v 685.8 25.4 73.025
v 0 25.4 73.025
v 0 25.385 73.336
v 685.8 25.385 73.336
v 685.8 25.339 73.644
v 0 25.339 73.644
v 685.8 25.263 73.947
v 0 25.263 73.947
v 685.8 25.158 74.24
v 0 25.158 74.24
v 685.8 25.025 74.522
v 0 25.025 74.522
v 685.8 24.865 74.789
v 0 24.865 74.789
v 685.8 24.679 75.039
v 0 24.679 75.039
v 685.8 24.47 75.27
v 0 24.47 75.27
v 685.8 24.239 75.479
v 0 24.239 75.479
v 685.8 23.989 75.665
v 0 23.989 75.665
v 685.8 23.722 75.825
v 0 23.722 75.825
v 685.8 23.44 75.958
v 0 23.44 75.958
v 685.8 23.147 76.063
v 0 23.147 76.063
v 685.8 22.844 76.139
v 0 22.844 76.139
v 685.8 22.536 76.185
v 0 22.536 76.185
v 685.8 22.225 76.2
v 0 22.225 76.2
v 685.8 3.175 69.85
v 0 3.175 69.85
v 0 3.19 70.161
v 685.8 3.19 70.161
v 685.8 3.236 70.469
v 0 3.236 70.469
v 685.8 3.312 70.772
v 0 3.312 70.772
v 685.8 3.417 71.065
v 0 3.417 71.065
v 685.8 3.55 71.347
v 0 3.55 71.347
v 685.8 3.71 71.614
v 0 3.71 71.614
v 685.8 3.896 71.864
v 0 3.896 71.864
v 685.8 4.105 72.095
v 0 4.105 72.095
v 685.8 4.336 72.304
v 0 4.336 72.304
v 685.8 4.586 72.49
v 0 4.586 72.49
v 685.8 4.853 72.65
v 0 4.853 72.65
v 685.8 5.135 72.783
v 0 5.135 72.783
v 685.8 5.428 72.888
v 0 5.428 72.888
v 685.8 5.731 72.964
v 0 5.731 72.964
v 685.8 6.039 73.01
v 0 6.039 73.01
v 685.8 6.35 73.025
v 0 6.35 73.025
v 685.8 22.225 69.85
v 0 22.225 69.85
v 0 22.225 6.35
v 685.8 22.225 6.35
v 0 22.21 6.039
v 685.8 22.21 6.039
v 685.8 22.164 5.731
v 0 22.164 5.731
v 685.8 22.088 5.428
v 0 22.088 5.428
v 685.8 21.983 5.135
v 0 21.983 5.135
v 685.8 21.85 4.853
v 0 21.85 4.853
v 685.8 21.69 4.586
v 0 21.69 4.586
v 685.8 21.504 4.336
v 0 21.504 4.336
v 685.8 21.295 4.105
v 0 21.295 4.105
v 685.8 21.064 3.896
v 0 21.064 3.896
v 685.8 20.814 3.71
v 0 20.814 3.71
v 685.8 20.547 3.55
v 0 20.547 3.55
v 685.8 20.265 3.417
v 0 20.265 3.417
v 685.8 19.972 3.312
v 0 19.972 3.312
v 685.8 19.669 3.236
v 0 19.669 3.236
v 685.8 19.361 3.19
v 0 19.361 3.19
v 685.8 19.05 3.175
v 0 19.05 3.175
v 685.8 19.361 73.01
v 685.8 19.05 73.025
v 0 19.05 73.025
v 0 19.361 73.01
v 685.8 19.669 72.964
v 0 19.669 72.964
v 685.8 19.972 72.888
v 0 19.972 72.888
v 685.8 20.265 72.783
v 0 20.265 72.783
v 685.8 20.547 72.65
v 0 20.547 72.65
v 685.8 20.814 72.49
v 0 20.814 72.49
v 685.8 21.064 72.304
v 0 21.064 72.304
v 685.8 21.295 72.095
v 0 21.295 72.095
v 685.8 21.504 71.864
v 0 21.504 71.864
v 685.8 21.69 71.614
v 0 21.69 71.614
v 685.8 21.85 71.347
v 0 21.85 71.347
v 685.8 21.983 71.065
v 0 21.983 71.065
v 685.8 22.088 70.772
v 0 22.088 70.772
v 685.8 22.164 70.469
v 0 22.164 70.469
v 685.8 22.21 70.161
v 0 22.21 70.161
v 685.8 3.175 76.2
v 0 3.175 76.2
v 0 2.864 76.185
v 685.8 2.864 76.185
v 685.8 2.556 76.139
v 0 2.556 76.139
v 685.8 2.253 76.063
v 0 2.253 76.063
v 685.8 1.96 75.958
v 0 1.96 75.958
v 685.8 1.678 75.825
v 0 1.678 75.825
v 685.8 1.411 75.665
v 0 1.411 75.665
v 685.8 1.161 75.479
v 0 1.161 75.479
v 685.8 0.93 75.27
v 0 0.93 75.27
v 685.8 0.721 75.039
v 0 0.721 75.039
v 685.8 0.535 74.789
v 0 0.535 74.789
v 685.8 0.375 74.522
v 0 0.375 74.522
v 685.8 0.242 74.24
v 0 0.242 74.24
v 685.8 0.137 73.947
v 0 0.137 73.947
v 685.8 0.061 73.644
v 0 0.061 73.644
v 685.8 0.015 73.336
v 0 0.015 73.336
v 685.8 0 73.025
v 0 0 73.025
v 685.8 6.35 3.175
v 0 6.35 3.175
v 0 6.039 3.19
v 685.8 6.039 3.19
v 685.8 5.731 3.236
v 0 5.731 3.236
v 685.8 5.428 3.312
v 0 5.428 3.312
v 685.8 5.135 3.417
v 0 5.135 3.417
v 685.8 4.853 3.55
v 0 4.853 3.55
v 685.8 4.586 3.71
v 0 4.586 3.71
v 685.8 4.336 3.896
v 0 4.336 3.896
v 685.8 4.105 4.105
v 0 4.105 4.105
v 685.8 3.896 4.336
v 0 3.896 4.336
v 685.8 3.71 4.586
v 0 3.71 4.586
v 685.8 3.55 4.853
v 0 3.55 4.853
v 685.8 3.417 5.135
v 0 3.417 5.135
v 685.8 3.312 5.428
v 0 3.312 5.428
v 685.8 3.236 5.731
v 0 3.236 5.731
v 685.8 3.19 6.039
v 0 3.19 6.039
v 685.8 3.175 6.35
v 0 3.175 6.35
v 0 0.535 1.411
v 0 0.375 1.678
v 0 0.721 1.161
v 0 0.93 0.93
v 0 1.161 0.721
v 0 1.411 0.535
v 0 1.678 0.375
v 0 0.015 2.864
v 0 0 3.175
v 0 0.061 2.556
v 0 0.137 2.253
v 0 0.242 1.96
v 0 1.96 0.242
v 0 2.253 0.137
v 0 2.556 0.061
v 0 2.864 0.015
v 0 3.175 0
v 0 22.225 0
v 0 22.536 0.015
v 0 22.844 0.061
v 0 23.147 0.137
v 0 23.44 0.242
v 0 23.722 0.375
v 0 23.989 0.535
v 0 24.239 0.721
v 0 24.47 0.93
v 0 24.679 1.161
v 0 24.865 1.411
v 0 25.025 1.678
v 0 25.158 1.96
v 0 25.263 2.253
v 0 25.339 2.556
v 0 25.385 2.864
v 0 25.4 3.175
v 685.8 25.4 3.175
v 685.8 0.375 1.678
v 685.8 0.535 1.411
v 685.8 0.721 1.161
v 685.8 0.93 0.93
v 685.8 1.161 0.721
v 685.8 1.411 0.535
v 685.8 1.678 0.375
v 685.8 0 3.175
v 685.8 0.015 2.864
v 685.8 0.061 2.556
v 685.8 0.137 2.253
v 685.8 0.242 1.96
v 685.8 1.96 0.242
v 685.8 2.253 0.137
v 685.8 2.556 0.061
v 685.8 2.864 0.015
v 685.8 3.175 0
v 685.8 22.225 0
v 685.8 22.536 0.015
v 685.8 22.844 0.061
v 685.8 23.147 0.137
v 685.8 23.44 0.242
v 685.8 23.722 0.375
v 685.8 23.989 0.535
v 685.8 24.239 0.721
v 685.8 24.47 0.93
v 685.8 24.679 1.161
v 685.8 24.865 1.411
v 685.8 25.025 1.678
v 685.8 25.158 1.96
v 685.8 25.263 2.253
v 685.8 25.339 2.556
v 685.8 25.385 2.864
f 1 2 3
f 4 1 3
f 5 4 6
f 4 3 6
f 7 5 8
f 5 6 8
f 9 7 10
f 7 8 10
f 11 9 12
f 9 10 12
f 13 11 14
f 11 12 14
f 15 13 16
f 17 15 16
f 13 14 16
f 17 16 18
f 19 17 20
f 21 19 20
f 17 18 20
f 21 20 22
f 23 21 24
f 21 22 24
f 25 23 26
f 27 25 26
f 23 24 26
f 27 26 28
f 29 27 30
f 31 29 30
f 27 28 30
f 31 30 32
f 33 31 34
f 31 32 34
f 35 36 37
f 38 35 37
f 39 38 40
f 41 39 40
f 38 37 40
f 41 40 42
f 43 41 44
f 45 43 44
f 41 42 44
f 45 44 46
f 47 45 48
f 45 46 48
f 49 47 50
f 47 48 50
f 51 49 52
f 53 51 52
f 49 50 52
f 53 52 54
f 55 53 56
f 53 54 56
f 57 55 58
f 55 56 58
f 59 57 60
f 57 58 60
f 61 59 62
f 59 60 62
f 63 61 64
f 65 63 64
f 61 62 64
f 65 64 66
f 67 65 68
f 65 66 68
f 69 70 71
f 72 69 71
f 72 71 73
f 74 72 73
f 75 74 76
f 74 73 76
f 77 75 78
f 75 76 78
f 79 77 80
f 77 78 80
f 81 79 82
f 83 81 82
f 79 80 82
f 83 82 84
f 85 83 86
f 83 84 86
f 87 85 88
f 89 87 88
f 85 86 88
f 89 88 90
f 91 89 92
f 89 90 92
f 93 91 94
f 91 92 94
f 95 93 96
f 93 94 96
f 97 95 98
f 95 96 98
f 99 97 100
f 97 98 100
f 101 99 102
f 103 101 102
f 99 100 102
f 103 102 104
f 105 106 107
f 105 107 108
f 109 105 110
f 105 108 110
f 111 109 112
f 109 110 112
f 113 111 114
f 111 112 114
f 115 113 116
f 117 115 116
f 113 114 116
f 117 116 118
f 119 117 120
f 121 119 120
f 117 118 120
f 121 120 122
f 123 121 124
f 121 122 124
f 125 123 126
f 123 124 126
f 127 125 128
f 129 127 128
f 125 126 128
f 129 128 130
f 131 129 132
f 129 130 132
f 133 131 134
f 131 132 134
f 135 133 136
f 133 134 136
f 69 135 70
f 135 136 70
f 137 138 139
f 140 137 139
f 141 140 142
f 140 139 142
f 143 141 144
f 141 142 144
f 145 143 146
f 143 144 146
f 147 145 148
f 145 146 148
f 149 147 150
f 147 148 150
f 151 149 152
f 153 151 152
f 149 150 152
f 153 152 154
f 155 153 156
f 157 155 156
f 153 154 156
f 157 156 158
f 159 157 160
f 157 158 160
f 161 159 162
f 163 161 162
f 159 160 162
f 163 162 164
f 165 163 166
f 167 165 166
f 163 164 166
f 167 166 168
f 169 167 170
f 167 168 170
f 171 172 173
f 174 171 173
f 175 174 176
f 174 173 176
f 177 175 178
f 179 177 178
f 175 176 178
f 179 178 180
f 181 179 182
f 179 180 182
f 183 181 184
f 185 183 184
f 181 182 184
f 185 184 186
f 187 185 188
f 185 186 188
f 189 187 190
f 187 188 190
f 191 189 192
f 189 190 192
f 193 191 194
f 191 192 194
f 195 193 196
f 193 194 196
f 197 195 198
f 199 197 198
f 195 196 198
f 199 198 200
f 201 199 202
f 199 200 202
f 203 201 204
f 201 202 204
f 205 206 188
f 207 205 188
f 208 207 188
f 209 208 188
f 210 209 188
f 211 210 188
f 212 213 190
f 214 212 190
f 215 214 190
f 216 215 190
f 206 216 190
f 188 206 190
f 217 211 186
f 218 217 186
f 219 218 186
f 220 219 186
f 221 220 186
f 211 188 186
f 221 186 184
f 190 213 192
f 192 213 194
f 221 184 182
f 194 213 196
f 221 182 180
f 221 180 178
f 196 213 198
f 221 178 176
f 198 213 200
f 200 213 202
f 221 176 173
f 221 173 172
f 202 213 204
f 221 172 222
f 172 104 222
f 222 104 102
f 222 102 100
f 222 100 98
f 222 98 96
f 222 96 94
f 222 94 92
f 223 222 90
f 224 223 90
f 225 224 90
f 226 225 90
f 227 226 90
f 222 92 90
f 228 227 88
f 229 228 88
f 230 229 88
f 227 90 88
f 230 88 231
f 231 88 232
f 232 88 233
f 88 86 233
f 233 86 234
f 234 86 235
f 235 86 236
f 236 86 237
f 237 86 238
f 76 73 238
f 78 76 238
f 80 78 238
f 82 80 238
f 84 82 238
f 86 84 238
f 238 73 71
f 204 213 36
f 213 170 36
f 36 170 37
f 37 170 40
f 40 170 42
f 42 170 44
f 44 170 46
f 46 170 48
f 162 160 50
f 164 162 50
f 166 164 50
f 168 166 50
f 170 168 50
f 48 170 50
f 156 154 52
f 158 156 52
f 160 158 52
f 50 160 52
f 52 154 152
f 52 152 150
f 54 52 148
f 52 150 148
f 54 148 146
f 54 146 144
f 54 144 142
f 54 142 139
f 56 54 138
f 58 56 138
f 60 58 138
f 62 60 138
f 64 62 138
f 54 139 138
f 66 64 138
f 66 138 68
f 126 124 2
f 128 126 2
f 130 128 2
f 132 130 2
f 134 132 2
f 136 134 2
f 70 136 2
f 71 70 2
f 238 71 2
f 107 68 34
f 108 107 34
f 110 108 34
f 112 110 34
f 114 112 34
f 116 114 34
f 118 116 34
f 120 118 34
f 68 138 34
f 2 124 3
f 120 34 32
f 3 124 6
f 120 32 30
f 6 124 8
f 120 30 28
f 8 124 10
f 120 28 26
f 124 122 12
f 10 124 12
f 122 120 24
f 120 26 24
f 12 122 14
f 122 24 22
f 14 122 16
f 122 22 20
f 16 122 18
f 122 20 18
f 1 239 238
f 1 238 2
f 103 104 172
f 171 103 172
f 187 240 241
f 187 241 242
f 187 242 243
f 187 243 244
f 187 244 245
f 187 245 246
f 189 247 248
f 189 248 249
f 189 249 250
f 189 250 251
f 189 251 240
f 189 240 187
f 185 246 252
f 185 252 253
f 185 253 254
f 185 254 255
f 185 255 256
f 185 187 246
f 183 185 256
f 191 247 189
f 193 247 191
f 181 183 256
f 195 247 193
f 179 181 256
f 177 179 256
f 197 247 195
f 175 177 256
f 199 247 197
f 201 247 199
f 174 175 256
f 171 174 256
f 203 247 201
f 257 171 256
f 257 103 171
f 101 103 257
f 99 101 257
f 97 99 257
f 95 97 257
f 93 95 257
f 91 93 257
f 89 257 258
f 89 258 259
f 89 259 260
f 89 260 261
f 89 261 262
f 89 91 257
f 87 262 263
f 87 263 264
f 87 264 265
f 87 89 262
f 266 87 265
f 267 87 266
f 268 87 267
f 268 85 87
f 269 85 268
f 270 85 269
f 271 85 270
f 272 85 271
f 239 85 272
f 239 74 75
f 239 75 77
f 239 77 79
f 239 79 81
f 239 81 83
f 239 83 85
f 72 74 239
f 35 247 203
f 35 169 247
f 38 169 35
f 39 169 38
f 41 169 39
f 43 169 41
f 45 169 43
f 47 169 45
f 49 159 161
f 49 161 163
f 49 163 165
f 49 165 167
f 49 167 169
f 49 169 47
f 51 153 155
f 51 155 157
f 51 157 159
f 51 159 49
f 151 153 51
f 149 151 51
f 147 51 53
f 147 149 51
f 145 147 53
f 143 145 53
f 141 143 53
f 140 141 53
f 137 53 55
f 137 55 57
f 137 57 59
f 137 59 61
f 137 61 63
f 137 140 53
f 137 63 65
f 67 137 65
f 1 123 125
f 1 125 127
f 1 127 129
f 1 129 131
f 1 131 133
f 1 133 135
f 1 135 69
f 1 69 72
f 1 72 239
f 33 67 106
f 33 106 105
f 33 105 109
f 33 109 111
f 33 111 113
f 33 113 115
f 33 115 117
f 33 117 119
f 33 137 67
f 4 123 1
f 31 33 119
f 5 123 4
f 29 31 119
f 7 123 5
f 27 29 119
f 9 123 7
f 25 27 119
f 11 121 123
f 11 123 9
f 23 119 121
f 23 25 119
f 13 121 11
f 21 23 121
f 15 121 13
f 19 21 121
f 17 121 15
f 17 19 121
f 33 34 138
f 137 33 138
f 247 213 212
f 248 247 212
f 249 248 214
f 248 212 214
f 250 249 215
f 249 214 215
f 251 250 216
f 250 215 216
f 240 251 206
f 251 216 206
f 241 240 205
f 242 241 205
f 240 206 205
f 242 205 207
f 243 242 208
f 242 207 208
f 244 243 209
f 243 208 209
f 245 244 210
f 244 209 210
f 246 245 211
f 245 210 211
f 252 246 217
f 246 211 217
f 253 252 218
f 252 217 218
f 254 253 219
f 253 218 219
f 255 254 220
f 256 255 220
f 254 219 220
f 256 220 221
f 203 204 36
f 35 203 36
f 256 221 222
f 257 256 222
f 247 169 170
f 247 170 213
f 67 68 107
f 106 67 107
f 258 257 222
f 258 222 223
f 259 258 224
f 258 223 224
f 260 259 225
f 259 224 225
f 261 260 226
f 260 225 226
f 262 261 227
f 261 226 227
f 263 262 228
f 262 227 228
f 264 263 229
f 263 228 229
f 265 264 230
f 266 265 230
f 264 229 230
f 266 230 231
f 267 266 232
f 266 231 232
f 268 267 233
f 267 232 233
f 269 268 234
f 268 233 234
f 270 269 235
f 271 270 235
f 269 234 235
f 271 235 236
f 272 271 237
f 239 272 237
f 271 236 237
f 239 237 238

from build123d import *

# Parameters (mm, degrees)
F1_DEPTH = 685.8


with BuildPart() as f1:
    # F0 (on Right) → F1 (new body)
    with BuildSketch(Plane.YZ):
        with BuildLine():
            ThreePointArc((0, 3.175), (0.929936, 0.929936), (3.175, 0))
            Line((3.175, 0), (22.225, 0))
            ThreePointArc((22.225, 0), (24.470064, 0.929936), (25.4, 3.175))
            Line((25.4, 3.175), (25.4, 73.025))
            ThreePointArc((25.4, 73.025), (24.470064, 75.270064), (22.225, 76.2))
            Line((22.225, 76.2), (3.175, 76.2))
            ThreePointArc((3.175, 76.2), (0.929936, 75.270064), (0, 73.025))
            Line((0, 73.025), (0, 3.175))
        make_face()
        with BuildLine():
            Line((19.05, 3.175), (6.35, 3.175))
            ThreePointArc((6.35, 3.175), (4.104936, 4.104936), (3.175, 6.35))
            Line((3.175, 6.35), (3.175, 69.85))
            ThreePointArc((3.175, 69.85), (4.104936, 72.095064), (6.35, 73.025))
            Line((6.35, 73.025), (19.05, 73.025))
            ThreePointArc((19.05, 73.025), (21.295064, 72.095064), (22.225, 69.85))
            Line((22.225, 69.85), (22.225, 6.35))
            ThreePointArc((22.225, 6.35), (21.295064, 4.104936), (19.05, 3.175))
        make_face(mode=Mode.SUBTRACT)
    extrude(amount=F1_DEPTH)


solid = f1.part
